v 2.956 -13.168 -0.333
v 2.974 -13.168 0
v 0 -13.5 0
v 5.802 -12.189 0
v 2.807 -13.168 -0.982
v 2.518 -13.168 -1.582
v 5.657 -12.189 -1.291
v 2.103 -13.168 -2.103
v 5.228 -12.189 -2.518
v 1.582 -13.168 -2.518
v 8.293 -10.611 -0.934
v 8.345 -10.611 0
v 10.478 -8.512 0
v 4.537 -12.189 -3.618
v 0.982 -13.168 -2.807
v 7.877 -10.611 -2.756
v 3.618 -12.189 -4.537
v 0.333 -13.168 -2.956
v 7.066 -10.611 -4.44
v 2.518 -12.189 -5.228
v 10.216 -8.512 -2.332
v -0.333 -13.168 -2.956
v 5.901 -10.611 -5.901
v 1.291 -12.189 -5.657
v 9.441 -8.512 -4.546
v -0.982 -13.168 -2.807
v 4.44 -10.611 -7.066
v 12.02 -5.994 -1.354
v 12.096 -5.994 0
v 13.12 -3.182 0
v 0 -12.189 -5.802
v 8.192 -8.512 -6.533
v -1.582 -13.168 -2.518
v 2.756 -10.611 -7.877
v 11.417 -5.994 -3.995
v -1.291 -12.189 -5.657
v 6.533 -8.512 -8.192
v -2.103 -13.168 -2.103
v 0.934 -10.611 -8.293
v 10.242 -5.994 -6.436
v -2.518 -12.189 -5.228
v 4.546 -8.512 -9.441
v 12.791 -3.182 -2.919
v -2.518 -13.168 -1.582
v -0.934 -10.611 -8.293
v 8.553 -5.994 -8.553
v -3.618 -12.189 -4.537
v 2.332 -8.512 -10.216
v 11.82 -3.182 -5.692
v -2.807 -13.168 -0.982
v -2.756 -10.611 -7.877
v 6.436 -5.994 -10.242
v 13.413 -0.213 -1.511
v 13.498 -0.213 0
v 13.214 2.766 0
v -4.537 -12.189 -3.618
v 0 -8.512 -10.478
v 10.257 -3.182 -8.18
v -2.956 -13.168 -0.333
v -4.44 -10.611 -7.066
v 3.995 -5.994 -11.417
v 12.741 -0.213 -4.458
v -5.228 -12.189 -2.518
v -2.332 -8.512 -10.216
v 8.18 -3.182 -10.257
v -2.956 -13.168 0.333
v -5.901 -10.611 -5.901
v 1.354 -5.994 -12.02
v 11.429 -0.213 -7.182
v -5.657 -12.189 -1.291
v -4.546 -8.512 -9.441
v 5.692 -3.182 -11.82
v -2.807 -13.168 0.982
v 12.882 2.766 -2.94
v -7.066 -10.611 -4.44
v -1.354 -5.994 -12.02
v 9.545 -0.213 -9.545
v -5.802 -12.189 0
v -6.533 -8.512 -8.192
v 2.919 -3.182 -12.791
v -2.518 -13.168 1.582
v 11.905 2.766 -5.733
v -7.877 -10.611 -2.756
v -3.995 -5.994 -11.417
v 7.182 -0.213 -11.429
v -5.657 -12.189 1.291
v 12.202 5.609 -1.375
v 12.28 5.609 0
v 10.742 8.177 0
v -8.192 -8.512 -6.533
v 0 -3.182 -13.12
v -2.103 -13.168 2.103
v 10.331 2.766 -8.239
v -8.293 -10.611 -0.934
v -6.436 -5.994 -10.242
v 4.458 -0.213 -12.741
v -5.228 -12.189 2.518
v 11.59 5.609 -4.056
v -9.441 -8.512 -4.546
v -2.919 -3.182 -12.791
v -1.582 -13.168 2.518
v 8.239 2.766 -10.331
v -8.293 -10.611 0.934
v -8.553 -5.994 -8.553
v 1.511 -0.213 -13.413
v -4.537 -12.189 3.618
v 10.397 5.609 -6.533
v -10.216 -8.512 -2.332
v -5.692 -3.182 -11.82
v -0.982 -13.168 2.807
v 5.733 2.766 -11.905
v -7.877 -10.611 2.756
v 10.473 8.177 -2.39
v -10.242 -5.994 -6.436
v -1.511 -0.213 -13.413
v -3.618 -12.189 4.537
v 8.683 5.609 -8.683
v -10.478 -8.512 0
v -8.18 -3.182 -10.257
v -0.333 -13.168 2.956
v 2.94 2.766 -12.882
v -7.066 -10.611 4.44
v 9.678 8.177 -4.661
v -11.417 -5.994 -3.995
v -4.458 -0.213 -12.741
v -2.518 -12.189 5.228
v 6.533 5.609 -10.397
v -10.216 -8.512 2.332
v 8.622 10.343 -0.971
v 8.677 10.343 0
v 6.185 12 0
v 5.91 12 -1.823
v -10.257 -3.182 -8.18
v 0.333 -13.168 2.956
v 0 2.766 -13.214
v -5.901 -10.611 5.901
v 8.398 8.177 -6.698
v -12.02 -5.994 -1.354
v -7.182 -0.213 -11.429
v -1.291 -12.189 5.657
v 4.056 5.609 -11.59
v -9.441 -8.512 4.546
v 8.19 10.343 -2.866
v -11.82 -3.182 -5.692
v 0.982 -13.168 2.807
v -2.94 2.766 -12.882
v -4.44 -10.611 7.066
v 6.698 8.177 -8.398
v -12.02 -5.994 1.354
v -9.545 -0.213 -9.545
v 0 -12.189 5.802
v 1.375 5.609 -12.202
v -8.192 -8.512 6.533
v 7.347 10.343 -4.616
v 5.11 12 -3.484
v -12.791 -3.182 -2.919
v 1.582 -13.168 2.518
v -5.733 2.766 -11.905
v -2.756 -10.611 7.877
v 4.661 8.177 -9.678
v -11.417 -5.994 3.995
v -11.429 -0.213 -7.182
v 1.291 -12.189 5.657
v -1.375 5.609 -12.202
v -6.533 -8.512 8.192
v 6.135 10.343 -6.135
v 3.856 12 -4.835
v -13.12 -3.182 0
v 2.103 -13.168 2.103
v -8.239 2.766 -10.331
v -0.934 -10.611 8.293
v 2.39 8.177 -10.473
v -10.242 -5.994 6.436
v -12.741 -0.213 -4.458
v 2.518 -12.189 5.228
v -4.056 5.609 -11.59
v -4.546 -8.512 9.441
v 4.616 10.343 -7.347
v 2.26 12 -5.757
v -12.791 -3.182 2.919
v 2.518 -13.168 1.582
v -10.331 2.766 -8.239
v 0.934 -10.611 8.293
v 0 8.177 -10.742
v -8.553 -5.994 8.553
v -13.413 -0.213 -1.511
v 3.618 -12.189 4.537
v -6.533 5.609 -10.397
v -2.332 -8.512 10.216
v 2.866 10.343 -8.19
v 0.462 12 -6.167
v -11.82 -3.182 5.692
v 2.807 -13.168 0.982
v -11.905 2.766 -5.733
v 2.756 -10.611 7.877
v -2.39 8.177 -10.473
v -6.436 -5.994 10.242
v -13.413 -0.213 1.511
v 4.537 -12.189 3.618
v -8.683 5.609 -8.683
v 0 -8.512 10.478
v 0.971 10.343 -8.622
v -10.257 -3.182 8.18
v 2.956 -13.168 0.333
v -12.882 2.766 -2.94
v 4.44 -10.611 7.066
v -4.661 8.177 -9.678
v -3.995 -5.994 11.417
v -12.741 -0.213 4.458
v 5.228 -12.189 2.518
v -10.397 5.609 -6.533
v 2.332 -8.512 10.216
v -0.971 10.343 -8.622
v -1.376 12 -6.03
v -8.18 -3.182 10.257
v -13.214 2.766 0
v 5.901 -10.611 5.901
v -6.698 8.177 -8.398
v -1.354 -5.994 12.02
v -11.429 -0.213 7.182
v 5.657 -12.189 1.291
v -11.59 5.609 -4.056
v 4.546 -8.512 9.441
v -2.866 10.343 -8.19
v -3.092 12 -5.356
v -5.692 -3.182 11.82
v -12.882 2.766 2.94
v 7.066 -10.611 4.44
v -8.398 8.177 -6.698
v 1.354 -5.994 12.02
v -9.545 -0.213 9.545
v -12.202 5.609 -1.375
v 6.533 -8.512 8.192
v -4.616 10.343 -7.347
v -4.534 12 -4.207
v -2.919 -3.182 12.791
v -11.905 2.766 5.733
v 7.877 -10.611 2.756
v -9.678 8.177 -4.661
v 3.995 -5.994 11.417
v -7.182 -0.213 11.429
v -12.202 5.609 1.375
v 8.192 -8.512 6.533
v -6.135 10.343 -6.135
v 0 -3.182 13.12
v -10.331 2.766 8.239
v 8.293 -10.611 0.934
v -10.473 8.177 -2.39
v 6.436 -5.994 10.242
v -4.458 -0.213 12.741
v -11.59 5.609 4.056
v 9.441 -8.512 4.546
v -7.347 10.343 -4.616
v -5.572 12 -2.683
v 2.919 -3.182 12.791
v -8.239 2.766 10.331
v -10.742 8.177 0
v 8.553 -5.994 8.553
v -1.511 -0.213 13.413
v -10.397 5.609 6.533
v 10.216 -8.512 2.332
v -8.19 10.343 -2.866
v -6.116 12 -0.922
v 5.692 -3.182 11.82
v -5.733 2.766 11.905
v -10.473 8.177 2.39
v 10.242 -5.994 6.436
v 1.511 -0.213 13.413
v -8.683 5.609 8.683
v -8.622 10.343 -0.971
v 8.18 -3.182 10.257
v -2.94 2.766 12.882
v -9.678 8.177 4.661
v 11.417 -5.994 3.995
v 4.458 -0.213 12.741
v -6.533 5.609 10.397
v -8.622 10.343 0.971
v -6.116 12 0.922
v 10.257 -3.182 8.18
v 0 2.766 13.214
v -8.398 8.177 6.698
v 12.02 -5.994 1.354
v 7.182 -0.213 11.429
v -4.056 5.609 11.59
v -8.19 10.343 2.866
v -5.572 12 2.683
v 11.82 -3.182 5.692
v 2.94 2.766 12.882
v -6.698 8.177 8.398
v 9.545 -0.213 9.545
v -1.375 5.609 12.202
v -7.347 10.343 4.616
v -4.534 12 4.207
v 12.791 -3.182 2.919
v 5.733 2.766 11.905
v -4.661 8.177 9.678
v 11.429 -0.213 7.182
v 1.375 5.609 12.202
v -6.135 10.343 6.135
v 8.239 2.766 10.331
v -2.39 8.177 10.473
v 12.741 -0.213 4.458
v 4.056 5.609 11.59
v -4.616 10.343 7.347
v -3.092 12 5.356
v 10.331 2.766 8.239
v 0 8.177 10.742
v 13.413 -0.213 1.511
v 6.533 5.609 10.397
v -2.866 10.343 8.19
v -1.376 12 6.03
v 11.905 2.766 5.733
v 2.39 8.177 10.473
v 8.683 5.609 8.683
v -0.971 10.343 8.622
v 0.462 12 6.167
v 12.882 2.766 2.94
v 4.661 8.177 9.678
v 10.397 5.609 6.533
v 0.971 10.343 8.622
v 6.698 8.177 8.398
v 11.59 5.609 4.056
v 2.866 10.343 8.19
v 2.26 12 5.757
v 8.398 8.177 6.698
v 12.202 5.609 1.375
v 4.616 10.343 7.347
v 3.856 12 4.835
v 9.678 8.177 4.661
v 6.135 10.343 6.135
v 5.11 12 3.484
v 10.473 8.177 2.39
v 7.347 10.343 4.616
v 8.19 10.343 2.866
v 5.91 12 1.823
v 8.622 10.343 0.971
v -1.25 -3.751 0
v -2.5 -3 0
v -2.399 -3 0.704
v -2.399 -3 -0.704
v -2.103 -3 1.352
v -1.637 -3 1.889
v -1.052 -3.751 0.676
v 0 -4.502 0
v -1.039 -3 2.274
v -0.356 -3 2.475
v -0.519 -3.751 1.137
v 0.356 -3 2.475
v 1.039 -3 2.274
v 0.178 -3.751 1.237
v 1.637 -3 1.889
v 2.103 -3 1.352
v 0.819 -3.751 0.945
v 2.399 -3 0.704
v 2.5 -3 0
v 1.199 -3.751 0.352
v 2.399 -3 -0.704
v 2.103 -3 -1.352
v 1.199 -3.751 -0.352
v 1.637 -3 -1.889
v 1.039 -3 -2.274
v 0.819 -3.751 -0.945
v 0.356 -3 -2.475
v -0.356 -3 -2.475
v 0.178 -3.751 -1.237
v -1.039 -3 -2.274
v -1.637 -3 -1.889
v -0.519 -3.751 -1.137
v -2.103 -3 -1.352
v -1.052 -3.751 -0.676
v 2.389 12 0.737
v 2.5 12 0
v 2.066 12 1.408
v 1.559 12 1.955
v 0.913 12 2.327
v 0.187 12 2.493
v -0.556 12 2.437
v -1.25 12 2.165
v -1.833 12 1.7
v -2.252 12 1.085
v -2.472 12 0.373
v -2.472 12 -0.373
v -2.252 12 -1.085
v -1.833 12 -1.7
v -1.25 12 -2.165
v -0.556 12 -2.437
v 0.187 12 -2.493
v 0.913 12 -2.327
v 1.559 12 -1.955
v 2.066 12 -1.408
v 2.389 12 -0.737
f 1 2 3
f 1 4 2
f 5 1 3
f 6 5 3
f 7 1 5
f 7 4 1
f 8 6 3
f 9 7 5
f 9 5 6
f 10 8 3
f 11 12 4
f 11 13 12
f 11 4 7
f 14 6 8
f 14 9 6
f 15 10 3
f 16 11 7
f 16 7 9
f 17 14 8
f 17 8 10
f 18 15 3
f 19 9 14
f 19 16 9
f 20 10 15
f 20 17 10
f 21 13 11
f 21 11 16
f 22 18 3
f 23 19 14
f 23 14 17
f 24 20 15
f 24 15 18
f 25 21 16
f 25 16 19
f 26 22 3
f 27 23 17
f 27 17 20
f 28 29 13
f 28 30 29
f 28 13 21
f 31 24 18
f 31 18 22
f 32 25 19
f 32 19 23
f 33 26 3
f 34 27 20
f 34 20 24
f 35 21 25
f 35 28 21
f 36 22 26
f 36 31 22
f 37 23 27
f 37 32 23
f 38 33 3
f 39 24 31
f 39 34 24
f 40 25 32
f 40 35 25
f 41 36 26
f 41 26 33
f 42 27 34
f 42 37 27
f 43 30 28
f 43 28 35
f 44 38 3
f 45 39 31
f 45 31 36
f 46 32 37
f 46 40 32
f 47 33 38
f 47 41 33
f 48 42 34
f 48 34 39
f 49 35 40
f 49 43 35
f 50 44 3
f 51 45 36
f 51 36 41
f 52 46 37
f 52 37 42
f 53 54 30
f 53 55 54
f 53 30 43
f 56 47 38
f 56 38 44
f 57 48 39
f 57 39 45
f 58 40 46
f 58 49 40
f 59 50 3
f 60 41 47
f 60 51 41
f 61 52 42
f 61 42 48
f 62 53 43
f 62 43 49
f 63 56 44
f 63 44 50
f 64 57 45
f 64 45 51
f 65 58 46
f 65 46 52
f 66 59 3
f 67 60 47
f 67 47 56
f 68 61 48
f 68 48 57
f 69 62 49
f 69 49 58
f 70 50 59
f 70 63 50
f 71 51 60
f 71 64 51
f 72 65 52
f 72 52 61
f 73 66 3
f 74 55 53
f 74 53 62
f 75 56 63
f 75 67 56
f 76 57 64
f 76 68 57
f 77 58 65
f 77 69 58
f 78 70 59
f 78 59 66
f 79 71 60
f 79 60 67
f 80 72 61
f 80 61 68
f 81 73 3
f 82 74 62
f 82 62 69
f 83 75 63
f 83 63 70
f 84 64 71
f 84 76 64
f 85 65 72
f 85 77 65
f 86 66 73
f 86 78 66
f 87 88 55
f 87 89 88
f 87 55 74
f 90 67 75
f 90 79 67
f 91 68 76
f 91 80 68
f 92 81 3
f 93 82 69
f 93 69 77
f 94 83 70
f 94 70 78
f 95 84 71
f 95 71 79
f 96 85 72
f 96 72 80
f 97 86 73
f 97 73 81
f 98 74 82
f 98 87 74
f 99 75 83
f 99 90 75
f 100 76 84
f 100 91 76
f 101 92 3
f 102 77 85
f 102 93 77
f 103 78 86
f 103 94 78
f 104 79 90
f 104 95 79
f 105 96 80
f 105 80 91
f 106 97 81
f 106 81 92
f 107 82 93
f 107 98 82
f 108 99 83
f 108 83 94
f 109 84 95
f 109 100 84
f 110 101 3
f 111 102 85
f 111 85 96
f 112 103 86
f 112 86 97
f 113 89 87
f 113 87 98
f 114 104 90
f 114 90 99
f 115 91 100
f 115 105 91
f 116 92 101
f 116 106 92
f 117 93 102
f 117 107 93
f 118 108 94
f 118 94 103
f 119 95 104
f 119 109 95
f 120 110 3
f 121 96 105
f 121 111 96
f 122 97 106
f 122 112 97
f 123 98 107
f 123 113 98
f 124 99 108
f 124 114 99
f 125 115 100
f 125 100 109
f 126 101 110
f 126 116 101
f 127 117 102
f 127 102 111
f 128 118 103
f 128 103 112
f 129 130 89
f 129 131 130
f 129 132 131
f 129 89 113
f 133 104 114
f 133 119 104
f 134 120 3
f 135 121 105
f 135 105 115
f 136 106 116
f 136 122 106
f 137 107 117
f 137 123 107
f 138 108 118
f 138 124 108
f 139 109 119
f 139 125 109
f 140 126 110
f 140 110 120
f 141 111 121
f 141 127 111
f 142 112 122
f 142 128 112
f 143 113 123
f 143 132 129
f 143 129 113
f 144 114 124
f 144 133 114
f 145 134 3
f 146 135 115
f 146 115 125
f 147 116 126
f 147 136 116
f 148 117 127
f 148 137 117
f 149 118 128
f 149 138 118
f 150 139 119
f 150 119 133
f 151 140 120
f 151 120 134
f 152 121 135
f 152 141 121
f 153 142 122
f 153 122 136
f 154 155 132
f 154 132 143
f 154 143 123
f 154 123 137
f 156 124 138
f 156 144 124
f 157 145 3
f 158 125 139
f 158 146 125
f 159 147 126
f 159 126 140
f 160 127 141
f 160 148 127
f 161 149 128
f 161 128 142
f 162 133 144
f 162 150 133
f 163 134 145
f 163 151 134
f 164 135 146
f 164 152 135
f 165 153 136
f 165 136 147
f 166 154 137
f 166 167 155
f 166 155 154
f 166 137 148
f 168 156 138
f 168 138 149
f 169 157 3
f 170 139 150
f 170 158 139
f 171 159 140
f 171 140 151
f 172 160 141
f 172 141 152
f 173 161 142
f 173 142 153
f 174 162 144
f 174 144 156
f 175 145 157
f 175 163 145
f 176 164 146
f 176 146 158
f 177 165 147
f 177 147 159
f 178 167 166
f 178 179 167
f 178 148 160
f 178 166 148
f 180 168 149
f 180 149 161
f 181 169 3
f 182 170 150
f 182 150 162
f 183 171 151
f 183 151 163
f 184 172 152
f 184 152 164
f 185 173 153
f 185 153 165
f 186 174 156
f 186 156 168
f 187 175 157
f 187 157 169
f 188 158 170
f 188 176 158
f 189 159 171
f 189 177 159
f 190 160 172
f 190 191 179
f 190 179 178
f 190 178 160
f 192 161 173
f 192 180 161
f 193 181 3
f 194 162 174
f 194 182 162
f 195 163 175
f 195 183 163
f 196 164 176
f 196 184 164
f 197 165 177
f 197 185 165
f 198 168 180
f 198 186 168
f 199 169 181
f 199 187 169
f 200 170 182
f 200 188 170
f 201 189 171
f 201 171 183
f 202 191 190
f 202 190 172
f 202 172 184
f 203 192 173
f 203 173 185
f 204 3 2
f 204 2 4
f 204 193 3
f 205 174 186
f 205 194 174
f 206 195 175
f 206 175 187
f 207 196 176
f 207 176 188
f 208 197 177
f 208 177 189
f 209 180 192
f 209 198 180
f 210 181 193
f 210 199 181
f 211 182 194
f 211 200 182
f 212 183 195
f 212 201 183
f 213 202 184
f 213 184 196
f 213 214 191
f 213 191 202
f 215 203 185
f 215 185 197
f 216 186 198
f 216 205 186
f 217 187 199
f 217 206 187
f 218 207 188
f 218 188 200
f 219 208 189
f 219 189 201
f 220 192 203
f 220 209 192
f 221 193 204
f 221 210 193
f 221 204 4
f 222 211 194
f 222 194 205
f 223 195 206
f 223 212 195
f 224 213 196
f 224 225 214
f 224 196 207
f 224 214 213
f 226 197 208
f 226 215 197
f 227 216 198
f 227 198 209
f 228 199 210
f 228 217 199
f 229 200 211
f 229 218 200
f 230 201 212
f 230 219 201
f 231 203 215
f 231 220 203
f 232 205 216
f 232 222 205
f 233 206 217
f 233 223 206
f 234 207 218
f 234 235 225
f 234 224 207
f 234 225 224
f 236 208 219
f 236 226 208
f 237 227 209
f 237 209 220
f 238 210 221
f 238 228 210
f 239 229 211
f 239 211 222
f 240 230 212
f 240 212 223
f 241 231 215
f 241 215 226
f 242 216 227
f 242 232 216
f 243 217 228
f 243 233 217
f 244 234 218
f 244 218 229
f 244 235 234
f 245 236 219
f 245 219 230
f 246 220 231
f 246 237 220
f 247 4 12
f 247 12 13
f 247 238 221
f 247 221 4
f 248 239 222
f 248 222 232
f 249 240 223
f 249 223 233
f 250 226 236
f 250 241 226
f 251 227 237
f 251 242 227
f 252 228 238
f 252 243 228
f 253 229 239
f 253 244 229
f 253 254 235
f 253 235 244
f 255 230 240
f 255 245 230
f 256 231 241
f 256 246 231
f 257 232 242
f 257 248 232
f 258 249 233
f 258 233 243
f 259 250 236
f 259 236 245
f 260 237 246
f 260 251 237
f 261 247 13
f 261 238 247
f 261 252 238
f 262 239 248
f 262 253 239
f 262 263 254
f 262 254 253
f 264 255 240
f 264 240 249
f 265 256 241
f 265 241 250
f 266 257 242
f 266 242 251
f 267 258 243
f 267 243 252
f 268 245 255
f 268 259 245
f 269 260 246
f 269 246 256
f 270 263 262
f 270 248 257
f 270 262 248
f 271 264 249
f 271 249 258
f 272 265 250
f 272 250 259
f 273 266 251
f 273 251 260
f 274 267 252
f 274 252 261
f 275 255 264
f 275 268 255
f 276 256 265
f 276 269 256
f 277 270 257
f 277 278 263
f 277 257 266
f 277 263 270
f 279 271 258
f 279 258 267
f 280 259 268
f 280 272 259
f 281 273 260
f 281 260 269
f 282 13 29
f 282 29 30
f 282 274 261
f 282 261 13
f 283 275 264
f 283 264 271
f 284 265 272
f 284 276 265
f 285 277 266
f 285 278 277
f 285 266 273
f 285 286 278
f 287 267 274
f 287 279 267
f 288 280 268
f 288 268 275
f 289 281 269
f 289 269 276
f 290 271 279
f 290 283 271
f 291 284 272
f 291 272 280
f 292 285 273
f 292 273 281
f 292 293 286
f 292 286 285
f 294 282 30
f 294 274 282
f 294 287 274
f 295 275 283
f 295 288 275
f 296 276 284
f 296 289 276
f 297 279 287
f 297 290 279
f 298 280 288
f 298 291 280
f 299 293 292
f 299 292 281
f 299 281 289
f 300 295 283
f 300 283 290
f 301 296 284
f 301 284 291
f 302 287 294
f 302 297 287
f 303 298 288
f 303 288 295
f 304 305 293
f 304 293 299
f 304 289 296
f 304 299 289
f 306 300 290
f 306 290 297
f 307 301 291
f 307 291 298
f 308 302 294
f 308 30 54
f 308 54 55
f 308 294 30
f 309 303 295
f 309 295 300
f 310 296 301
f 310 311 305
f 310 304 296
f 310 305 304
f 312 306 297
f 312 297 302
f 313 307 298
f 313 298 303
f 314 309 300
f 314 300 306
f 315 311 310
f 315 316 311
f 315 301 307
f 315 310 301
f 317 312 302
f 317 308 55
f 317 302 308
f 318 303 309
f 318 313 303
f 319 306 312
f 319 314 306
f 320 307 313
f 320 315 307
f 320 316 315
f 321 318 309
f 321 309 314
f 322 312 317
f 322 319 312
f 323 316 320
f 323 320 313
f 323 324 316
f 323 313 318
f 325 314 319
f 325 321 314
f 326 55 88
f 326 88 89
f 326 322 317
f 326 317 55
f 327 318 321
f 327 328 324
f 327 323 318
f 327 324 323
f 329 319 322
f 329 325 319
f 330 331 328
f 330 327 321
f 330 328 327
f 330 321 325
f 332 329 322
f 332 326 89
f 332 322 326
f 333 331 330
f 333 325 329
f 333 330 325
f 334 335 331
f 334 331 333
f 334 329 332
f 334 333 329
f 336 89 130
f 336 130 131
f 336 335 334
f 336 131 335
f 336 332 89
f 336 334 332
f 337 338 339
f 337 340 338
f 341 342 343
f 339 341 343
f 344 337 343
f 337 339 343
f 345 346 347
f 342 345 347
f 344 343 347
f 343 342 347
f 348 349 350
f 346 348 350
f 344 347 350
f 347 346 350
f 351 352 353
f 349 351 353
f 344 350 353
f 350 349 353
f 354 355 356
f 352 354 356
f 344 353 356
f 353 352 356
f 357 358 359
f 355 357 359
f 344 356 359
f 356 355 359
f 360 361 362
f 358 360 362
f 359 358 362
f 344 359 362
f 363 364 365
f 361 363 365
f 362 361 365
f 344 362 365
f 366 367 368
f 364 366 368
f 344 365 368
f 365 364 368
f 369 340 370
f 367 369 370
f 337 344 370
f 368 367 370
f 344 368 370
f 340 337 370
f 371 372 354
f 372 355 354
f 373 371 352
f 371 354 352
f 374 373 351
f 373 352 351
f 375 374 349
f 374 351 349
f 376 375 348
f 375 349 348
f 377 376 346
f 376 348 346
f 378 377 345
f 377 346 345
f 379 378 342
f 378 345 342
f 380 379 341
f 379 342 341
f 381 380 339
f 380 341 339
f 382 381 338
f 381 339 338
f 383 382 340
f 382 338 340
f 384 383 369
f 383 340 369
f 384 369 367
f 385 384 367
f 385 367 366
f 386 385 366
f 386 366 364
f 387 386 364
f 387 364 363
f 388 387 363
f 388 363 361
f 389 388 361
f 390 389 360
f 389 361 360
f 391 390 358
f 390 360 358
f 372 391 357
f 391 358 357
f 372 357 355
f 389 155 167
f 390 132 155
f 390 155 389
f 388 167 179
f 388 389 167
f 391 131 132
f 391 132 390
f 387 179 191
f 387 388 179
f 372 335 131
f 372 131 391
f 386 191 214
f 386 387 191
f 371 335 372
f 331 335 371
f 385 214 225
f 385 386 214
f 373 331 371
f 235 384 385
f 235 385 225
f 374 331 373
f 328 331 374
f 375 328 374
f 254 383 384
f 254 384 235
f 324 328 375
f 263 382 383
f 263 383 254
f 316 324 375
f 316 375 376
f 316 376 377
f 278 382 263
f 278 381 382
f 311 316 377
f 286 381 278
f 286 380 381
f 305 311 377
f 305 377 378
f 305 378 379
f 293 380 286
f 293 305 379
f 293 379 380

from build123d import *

# Parameters (mm, degrees)
SKETCH_2_R             = 15.938729937
CUT_EXTRUDE_1_DEPTH    = 10
HOLE_WIZARD_M6_1_D     = 5
HOLE_WIZARD_M6_1_DEPTH = 15
HOLE_WIZARD_M6_1_TIP   = 1.502151548


with BuildPart() as part:
    # 草图1 → 旋转1 (revolve)
    with BuildSketch(Plane.XY):
        with BuildLine():
            Line((0, 13.5), (0, -13.5))
            ThreePointArc((0, -13.5), (13.5, 0), (0, 13.5))
        make_face()
    revolve(axis=Axis((0, 0, 0), (0, 1, 0)))

    # 草图2 → 切除-拉伸1 (cut)
    with BuildSketch(Plane(origin=(0, 12, 0), x_dir=(-1, 0, 0), z_dir=(0, 1, 0))):
        Circle(SKETCH_2_R)
    extrude(amount=CUT_EXTRUDE_1_DEPTH, mode=Mode.SUBTRACT)

    # M6 螺纹孔1
    with Locations(Plane(origin=(0, 12, 0), x_dir=(-1, 0, 0), z_dir=(0, 1, 0))):
        with Locations((0, 0)):
            Hole(HOLE_WIZARD_M6_1_D / 2, depth=HOLE_WIZARD_M6_1_DEPTH)
            with Locations((0, 0, -(HOLE_WIZARD_M6_1_DEPTH + HOLE_WIZARD_M6_1_TIP / 2))):  # 118° drill point
                Cone(0, HOLE_WIZARD_M6_1_D / 2, HOLE_WIZARD_M6_1_TIP, mode=Mode.SUBTRACT)


solid = part.part
